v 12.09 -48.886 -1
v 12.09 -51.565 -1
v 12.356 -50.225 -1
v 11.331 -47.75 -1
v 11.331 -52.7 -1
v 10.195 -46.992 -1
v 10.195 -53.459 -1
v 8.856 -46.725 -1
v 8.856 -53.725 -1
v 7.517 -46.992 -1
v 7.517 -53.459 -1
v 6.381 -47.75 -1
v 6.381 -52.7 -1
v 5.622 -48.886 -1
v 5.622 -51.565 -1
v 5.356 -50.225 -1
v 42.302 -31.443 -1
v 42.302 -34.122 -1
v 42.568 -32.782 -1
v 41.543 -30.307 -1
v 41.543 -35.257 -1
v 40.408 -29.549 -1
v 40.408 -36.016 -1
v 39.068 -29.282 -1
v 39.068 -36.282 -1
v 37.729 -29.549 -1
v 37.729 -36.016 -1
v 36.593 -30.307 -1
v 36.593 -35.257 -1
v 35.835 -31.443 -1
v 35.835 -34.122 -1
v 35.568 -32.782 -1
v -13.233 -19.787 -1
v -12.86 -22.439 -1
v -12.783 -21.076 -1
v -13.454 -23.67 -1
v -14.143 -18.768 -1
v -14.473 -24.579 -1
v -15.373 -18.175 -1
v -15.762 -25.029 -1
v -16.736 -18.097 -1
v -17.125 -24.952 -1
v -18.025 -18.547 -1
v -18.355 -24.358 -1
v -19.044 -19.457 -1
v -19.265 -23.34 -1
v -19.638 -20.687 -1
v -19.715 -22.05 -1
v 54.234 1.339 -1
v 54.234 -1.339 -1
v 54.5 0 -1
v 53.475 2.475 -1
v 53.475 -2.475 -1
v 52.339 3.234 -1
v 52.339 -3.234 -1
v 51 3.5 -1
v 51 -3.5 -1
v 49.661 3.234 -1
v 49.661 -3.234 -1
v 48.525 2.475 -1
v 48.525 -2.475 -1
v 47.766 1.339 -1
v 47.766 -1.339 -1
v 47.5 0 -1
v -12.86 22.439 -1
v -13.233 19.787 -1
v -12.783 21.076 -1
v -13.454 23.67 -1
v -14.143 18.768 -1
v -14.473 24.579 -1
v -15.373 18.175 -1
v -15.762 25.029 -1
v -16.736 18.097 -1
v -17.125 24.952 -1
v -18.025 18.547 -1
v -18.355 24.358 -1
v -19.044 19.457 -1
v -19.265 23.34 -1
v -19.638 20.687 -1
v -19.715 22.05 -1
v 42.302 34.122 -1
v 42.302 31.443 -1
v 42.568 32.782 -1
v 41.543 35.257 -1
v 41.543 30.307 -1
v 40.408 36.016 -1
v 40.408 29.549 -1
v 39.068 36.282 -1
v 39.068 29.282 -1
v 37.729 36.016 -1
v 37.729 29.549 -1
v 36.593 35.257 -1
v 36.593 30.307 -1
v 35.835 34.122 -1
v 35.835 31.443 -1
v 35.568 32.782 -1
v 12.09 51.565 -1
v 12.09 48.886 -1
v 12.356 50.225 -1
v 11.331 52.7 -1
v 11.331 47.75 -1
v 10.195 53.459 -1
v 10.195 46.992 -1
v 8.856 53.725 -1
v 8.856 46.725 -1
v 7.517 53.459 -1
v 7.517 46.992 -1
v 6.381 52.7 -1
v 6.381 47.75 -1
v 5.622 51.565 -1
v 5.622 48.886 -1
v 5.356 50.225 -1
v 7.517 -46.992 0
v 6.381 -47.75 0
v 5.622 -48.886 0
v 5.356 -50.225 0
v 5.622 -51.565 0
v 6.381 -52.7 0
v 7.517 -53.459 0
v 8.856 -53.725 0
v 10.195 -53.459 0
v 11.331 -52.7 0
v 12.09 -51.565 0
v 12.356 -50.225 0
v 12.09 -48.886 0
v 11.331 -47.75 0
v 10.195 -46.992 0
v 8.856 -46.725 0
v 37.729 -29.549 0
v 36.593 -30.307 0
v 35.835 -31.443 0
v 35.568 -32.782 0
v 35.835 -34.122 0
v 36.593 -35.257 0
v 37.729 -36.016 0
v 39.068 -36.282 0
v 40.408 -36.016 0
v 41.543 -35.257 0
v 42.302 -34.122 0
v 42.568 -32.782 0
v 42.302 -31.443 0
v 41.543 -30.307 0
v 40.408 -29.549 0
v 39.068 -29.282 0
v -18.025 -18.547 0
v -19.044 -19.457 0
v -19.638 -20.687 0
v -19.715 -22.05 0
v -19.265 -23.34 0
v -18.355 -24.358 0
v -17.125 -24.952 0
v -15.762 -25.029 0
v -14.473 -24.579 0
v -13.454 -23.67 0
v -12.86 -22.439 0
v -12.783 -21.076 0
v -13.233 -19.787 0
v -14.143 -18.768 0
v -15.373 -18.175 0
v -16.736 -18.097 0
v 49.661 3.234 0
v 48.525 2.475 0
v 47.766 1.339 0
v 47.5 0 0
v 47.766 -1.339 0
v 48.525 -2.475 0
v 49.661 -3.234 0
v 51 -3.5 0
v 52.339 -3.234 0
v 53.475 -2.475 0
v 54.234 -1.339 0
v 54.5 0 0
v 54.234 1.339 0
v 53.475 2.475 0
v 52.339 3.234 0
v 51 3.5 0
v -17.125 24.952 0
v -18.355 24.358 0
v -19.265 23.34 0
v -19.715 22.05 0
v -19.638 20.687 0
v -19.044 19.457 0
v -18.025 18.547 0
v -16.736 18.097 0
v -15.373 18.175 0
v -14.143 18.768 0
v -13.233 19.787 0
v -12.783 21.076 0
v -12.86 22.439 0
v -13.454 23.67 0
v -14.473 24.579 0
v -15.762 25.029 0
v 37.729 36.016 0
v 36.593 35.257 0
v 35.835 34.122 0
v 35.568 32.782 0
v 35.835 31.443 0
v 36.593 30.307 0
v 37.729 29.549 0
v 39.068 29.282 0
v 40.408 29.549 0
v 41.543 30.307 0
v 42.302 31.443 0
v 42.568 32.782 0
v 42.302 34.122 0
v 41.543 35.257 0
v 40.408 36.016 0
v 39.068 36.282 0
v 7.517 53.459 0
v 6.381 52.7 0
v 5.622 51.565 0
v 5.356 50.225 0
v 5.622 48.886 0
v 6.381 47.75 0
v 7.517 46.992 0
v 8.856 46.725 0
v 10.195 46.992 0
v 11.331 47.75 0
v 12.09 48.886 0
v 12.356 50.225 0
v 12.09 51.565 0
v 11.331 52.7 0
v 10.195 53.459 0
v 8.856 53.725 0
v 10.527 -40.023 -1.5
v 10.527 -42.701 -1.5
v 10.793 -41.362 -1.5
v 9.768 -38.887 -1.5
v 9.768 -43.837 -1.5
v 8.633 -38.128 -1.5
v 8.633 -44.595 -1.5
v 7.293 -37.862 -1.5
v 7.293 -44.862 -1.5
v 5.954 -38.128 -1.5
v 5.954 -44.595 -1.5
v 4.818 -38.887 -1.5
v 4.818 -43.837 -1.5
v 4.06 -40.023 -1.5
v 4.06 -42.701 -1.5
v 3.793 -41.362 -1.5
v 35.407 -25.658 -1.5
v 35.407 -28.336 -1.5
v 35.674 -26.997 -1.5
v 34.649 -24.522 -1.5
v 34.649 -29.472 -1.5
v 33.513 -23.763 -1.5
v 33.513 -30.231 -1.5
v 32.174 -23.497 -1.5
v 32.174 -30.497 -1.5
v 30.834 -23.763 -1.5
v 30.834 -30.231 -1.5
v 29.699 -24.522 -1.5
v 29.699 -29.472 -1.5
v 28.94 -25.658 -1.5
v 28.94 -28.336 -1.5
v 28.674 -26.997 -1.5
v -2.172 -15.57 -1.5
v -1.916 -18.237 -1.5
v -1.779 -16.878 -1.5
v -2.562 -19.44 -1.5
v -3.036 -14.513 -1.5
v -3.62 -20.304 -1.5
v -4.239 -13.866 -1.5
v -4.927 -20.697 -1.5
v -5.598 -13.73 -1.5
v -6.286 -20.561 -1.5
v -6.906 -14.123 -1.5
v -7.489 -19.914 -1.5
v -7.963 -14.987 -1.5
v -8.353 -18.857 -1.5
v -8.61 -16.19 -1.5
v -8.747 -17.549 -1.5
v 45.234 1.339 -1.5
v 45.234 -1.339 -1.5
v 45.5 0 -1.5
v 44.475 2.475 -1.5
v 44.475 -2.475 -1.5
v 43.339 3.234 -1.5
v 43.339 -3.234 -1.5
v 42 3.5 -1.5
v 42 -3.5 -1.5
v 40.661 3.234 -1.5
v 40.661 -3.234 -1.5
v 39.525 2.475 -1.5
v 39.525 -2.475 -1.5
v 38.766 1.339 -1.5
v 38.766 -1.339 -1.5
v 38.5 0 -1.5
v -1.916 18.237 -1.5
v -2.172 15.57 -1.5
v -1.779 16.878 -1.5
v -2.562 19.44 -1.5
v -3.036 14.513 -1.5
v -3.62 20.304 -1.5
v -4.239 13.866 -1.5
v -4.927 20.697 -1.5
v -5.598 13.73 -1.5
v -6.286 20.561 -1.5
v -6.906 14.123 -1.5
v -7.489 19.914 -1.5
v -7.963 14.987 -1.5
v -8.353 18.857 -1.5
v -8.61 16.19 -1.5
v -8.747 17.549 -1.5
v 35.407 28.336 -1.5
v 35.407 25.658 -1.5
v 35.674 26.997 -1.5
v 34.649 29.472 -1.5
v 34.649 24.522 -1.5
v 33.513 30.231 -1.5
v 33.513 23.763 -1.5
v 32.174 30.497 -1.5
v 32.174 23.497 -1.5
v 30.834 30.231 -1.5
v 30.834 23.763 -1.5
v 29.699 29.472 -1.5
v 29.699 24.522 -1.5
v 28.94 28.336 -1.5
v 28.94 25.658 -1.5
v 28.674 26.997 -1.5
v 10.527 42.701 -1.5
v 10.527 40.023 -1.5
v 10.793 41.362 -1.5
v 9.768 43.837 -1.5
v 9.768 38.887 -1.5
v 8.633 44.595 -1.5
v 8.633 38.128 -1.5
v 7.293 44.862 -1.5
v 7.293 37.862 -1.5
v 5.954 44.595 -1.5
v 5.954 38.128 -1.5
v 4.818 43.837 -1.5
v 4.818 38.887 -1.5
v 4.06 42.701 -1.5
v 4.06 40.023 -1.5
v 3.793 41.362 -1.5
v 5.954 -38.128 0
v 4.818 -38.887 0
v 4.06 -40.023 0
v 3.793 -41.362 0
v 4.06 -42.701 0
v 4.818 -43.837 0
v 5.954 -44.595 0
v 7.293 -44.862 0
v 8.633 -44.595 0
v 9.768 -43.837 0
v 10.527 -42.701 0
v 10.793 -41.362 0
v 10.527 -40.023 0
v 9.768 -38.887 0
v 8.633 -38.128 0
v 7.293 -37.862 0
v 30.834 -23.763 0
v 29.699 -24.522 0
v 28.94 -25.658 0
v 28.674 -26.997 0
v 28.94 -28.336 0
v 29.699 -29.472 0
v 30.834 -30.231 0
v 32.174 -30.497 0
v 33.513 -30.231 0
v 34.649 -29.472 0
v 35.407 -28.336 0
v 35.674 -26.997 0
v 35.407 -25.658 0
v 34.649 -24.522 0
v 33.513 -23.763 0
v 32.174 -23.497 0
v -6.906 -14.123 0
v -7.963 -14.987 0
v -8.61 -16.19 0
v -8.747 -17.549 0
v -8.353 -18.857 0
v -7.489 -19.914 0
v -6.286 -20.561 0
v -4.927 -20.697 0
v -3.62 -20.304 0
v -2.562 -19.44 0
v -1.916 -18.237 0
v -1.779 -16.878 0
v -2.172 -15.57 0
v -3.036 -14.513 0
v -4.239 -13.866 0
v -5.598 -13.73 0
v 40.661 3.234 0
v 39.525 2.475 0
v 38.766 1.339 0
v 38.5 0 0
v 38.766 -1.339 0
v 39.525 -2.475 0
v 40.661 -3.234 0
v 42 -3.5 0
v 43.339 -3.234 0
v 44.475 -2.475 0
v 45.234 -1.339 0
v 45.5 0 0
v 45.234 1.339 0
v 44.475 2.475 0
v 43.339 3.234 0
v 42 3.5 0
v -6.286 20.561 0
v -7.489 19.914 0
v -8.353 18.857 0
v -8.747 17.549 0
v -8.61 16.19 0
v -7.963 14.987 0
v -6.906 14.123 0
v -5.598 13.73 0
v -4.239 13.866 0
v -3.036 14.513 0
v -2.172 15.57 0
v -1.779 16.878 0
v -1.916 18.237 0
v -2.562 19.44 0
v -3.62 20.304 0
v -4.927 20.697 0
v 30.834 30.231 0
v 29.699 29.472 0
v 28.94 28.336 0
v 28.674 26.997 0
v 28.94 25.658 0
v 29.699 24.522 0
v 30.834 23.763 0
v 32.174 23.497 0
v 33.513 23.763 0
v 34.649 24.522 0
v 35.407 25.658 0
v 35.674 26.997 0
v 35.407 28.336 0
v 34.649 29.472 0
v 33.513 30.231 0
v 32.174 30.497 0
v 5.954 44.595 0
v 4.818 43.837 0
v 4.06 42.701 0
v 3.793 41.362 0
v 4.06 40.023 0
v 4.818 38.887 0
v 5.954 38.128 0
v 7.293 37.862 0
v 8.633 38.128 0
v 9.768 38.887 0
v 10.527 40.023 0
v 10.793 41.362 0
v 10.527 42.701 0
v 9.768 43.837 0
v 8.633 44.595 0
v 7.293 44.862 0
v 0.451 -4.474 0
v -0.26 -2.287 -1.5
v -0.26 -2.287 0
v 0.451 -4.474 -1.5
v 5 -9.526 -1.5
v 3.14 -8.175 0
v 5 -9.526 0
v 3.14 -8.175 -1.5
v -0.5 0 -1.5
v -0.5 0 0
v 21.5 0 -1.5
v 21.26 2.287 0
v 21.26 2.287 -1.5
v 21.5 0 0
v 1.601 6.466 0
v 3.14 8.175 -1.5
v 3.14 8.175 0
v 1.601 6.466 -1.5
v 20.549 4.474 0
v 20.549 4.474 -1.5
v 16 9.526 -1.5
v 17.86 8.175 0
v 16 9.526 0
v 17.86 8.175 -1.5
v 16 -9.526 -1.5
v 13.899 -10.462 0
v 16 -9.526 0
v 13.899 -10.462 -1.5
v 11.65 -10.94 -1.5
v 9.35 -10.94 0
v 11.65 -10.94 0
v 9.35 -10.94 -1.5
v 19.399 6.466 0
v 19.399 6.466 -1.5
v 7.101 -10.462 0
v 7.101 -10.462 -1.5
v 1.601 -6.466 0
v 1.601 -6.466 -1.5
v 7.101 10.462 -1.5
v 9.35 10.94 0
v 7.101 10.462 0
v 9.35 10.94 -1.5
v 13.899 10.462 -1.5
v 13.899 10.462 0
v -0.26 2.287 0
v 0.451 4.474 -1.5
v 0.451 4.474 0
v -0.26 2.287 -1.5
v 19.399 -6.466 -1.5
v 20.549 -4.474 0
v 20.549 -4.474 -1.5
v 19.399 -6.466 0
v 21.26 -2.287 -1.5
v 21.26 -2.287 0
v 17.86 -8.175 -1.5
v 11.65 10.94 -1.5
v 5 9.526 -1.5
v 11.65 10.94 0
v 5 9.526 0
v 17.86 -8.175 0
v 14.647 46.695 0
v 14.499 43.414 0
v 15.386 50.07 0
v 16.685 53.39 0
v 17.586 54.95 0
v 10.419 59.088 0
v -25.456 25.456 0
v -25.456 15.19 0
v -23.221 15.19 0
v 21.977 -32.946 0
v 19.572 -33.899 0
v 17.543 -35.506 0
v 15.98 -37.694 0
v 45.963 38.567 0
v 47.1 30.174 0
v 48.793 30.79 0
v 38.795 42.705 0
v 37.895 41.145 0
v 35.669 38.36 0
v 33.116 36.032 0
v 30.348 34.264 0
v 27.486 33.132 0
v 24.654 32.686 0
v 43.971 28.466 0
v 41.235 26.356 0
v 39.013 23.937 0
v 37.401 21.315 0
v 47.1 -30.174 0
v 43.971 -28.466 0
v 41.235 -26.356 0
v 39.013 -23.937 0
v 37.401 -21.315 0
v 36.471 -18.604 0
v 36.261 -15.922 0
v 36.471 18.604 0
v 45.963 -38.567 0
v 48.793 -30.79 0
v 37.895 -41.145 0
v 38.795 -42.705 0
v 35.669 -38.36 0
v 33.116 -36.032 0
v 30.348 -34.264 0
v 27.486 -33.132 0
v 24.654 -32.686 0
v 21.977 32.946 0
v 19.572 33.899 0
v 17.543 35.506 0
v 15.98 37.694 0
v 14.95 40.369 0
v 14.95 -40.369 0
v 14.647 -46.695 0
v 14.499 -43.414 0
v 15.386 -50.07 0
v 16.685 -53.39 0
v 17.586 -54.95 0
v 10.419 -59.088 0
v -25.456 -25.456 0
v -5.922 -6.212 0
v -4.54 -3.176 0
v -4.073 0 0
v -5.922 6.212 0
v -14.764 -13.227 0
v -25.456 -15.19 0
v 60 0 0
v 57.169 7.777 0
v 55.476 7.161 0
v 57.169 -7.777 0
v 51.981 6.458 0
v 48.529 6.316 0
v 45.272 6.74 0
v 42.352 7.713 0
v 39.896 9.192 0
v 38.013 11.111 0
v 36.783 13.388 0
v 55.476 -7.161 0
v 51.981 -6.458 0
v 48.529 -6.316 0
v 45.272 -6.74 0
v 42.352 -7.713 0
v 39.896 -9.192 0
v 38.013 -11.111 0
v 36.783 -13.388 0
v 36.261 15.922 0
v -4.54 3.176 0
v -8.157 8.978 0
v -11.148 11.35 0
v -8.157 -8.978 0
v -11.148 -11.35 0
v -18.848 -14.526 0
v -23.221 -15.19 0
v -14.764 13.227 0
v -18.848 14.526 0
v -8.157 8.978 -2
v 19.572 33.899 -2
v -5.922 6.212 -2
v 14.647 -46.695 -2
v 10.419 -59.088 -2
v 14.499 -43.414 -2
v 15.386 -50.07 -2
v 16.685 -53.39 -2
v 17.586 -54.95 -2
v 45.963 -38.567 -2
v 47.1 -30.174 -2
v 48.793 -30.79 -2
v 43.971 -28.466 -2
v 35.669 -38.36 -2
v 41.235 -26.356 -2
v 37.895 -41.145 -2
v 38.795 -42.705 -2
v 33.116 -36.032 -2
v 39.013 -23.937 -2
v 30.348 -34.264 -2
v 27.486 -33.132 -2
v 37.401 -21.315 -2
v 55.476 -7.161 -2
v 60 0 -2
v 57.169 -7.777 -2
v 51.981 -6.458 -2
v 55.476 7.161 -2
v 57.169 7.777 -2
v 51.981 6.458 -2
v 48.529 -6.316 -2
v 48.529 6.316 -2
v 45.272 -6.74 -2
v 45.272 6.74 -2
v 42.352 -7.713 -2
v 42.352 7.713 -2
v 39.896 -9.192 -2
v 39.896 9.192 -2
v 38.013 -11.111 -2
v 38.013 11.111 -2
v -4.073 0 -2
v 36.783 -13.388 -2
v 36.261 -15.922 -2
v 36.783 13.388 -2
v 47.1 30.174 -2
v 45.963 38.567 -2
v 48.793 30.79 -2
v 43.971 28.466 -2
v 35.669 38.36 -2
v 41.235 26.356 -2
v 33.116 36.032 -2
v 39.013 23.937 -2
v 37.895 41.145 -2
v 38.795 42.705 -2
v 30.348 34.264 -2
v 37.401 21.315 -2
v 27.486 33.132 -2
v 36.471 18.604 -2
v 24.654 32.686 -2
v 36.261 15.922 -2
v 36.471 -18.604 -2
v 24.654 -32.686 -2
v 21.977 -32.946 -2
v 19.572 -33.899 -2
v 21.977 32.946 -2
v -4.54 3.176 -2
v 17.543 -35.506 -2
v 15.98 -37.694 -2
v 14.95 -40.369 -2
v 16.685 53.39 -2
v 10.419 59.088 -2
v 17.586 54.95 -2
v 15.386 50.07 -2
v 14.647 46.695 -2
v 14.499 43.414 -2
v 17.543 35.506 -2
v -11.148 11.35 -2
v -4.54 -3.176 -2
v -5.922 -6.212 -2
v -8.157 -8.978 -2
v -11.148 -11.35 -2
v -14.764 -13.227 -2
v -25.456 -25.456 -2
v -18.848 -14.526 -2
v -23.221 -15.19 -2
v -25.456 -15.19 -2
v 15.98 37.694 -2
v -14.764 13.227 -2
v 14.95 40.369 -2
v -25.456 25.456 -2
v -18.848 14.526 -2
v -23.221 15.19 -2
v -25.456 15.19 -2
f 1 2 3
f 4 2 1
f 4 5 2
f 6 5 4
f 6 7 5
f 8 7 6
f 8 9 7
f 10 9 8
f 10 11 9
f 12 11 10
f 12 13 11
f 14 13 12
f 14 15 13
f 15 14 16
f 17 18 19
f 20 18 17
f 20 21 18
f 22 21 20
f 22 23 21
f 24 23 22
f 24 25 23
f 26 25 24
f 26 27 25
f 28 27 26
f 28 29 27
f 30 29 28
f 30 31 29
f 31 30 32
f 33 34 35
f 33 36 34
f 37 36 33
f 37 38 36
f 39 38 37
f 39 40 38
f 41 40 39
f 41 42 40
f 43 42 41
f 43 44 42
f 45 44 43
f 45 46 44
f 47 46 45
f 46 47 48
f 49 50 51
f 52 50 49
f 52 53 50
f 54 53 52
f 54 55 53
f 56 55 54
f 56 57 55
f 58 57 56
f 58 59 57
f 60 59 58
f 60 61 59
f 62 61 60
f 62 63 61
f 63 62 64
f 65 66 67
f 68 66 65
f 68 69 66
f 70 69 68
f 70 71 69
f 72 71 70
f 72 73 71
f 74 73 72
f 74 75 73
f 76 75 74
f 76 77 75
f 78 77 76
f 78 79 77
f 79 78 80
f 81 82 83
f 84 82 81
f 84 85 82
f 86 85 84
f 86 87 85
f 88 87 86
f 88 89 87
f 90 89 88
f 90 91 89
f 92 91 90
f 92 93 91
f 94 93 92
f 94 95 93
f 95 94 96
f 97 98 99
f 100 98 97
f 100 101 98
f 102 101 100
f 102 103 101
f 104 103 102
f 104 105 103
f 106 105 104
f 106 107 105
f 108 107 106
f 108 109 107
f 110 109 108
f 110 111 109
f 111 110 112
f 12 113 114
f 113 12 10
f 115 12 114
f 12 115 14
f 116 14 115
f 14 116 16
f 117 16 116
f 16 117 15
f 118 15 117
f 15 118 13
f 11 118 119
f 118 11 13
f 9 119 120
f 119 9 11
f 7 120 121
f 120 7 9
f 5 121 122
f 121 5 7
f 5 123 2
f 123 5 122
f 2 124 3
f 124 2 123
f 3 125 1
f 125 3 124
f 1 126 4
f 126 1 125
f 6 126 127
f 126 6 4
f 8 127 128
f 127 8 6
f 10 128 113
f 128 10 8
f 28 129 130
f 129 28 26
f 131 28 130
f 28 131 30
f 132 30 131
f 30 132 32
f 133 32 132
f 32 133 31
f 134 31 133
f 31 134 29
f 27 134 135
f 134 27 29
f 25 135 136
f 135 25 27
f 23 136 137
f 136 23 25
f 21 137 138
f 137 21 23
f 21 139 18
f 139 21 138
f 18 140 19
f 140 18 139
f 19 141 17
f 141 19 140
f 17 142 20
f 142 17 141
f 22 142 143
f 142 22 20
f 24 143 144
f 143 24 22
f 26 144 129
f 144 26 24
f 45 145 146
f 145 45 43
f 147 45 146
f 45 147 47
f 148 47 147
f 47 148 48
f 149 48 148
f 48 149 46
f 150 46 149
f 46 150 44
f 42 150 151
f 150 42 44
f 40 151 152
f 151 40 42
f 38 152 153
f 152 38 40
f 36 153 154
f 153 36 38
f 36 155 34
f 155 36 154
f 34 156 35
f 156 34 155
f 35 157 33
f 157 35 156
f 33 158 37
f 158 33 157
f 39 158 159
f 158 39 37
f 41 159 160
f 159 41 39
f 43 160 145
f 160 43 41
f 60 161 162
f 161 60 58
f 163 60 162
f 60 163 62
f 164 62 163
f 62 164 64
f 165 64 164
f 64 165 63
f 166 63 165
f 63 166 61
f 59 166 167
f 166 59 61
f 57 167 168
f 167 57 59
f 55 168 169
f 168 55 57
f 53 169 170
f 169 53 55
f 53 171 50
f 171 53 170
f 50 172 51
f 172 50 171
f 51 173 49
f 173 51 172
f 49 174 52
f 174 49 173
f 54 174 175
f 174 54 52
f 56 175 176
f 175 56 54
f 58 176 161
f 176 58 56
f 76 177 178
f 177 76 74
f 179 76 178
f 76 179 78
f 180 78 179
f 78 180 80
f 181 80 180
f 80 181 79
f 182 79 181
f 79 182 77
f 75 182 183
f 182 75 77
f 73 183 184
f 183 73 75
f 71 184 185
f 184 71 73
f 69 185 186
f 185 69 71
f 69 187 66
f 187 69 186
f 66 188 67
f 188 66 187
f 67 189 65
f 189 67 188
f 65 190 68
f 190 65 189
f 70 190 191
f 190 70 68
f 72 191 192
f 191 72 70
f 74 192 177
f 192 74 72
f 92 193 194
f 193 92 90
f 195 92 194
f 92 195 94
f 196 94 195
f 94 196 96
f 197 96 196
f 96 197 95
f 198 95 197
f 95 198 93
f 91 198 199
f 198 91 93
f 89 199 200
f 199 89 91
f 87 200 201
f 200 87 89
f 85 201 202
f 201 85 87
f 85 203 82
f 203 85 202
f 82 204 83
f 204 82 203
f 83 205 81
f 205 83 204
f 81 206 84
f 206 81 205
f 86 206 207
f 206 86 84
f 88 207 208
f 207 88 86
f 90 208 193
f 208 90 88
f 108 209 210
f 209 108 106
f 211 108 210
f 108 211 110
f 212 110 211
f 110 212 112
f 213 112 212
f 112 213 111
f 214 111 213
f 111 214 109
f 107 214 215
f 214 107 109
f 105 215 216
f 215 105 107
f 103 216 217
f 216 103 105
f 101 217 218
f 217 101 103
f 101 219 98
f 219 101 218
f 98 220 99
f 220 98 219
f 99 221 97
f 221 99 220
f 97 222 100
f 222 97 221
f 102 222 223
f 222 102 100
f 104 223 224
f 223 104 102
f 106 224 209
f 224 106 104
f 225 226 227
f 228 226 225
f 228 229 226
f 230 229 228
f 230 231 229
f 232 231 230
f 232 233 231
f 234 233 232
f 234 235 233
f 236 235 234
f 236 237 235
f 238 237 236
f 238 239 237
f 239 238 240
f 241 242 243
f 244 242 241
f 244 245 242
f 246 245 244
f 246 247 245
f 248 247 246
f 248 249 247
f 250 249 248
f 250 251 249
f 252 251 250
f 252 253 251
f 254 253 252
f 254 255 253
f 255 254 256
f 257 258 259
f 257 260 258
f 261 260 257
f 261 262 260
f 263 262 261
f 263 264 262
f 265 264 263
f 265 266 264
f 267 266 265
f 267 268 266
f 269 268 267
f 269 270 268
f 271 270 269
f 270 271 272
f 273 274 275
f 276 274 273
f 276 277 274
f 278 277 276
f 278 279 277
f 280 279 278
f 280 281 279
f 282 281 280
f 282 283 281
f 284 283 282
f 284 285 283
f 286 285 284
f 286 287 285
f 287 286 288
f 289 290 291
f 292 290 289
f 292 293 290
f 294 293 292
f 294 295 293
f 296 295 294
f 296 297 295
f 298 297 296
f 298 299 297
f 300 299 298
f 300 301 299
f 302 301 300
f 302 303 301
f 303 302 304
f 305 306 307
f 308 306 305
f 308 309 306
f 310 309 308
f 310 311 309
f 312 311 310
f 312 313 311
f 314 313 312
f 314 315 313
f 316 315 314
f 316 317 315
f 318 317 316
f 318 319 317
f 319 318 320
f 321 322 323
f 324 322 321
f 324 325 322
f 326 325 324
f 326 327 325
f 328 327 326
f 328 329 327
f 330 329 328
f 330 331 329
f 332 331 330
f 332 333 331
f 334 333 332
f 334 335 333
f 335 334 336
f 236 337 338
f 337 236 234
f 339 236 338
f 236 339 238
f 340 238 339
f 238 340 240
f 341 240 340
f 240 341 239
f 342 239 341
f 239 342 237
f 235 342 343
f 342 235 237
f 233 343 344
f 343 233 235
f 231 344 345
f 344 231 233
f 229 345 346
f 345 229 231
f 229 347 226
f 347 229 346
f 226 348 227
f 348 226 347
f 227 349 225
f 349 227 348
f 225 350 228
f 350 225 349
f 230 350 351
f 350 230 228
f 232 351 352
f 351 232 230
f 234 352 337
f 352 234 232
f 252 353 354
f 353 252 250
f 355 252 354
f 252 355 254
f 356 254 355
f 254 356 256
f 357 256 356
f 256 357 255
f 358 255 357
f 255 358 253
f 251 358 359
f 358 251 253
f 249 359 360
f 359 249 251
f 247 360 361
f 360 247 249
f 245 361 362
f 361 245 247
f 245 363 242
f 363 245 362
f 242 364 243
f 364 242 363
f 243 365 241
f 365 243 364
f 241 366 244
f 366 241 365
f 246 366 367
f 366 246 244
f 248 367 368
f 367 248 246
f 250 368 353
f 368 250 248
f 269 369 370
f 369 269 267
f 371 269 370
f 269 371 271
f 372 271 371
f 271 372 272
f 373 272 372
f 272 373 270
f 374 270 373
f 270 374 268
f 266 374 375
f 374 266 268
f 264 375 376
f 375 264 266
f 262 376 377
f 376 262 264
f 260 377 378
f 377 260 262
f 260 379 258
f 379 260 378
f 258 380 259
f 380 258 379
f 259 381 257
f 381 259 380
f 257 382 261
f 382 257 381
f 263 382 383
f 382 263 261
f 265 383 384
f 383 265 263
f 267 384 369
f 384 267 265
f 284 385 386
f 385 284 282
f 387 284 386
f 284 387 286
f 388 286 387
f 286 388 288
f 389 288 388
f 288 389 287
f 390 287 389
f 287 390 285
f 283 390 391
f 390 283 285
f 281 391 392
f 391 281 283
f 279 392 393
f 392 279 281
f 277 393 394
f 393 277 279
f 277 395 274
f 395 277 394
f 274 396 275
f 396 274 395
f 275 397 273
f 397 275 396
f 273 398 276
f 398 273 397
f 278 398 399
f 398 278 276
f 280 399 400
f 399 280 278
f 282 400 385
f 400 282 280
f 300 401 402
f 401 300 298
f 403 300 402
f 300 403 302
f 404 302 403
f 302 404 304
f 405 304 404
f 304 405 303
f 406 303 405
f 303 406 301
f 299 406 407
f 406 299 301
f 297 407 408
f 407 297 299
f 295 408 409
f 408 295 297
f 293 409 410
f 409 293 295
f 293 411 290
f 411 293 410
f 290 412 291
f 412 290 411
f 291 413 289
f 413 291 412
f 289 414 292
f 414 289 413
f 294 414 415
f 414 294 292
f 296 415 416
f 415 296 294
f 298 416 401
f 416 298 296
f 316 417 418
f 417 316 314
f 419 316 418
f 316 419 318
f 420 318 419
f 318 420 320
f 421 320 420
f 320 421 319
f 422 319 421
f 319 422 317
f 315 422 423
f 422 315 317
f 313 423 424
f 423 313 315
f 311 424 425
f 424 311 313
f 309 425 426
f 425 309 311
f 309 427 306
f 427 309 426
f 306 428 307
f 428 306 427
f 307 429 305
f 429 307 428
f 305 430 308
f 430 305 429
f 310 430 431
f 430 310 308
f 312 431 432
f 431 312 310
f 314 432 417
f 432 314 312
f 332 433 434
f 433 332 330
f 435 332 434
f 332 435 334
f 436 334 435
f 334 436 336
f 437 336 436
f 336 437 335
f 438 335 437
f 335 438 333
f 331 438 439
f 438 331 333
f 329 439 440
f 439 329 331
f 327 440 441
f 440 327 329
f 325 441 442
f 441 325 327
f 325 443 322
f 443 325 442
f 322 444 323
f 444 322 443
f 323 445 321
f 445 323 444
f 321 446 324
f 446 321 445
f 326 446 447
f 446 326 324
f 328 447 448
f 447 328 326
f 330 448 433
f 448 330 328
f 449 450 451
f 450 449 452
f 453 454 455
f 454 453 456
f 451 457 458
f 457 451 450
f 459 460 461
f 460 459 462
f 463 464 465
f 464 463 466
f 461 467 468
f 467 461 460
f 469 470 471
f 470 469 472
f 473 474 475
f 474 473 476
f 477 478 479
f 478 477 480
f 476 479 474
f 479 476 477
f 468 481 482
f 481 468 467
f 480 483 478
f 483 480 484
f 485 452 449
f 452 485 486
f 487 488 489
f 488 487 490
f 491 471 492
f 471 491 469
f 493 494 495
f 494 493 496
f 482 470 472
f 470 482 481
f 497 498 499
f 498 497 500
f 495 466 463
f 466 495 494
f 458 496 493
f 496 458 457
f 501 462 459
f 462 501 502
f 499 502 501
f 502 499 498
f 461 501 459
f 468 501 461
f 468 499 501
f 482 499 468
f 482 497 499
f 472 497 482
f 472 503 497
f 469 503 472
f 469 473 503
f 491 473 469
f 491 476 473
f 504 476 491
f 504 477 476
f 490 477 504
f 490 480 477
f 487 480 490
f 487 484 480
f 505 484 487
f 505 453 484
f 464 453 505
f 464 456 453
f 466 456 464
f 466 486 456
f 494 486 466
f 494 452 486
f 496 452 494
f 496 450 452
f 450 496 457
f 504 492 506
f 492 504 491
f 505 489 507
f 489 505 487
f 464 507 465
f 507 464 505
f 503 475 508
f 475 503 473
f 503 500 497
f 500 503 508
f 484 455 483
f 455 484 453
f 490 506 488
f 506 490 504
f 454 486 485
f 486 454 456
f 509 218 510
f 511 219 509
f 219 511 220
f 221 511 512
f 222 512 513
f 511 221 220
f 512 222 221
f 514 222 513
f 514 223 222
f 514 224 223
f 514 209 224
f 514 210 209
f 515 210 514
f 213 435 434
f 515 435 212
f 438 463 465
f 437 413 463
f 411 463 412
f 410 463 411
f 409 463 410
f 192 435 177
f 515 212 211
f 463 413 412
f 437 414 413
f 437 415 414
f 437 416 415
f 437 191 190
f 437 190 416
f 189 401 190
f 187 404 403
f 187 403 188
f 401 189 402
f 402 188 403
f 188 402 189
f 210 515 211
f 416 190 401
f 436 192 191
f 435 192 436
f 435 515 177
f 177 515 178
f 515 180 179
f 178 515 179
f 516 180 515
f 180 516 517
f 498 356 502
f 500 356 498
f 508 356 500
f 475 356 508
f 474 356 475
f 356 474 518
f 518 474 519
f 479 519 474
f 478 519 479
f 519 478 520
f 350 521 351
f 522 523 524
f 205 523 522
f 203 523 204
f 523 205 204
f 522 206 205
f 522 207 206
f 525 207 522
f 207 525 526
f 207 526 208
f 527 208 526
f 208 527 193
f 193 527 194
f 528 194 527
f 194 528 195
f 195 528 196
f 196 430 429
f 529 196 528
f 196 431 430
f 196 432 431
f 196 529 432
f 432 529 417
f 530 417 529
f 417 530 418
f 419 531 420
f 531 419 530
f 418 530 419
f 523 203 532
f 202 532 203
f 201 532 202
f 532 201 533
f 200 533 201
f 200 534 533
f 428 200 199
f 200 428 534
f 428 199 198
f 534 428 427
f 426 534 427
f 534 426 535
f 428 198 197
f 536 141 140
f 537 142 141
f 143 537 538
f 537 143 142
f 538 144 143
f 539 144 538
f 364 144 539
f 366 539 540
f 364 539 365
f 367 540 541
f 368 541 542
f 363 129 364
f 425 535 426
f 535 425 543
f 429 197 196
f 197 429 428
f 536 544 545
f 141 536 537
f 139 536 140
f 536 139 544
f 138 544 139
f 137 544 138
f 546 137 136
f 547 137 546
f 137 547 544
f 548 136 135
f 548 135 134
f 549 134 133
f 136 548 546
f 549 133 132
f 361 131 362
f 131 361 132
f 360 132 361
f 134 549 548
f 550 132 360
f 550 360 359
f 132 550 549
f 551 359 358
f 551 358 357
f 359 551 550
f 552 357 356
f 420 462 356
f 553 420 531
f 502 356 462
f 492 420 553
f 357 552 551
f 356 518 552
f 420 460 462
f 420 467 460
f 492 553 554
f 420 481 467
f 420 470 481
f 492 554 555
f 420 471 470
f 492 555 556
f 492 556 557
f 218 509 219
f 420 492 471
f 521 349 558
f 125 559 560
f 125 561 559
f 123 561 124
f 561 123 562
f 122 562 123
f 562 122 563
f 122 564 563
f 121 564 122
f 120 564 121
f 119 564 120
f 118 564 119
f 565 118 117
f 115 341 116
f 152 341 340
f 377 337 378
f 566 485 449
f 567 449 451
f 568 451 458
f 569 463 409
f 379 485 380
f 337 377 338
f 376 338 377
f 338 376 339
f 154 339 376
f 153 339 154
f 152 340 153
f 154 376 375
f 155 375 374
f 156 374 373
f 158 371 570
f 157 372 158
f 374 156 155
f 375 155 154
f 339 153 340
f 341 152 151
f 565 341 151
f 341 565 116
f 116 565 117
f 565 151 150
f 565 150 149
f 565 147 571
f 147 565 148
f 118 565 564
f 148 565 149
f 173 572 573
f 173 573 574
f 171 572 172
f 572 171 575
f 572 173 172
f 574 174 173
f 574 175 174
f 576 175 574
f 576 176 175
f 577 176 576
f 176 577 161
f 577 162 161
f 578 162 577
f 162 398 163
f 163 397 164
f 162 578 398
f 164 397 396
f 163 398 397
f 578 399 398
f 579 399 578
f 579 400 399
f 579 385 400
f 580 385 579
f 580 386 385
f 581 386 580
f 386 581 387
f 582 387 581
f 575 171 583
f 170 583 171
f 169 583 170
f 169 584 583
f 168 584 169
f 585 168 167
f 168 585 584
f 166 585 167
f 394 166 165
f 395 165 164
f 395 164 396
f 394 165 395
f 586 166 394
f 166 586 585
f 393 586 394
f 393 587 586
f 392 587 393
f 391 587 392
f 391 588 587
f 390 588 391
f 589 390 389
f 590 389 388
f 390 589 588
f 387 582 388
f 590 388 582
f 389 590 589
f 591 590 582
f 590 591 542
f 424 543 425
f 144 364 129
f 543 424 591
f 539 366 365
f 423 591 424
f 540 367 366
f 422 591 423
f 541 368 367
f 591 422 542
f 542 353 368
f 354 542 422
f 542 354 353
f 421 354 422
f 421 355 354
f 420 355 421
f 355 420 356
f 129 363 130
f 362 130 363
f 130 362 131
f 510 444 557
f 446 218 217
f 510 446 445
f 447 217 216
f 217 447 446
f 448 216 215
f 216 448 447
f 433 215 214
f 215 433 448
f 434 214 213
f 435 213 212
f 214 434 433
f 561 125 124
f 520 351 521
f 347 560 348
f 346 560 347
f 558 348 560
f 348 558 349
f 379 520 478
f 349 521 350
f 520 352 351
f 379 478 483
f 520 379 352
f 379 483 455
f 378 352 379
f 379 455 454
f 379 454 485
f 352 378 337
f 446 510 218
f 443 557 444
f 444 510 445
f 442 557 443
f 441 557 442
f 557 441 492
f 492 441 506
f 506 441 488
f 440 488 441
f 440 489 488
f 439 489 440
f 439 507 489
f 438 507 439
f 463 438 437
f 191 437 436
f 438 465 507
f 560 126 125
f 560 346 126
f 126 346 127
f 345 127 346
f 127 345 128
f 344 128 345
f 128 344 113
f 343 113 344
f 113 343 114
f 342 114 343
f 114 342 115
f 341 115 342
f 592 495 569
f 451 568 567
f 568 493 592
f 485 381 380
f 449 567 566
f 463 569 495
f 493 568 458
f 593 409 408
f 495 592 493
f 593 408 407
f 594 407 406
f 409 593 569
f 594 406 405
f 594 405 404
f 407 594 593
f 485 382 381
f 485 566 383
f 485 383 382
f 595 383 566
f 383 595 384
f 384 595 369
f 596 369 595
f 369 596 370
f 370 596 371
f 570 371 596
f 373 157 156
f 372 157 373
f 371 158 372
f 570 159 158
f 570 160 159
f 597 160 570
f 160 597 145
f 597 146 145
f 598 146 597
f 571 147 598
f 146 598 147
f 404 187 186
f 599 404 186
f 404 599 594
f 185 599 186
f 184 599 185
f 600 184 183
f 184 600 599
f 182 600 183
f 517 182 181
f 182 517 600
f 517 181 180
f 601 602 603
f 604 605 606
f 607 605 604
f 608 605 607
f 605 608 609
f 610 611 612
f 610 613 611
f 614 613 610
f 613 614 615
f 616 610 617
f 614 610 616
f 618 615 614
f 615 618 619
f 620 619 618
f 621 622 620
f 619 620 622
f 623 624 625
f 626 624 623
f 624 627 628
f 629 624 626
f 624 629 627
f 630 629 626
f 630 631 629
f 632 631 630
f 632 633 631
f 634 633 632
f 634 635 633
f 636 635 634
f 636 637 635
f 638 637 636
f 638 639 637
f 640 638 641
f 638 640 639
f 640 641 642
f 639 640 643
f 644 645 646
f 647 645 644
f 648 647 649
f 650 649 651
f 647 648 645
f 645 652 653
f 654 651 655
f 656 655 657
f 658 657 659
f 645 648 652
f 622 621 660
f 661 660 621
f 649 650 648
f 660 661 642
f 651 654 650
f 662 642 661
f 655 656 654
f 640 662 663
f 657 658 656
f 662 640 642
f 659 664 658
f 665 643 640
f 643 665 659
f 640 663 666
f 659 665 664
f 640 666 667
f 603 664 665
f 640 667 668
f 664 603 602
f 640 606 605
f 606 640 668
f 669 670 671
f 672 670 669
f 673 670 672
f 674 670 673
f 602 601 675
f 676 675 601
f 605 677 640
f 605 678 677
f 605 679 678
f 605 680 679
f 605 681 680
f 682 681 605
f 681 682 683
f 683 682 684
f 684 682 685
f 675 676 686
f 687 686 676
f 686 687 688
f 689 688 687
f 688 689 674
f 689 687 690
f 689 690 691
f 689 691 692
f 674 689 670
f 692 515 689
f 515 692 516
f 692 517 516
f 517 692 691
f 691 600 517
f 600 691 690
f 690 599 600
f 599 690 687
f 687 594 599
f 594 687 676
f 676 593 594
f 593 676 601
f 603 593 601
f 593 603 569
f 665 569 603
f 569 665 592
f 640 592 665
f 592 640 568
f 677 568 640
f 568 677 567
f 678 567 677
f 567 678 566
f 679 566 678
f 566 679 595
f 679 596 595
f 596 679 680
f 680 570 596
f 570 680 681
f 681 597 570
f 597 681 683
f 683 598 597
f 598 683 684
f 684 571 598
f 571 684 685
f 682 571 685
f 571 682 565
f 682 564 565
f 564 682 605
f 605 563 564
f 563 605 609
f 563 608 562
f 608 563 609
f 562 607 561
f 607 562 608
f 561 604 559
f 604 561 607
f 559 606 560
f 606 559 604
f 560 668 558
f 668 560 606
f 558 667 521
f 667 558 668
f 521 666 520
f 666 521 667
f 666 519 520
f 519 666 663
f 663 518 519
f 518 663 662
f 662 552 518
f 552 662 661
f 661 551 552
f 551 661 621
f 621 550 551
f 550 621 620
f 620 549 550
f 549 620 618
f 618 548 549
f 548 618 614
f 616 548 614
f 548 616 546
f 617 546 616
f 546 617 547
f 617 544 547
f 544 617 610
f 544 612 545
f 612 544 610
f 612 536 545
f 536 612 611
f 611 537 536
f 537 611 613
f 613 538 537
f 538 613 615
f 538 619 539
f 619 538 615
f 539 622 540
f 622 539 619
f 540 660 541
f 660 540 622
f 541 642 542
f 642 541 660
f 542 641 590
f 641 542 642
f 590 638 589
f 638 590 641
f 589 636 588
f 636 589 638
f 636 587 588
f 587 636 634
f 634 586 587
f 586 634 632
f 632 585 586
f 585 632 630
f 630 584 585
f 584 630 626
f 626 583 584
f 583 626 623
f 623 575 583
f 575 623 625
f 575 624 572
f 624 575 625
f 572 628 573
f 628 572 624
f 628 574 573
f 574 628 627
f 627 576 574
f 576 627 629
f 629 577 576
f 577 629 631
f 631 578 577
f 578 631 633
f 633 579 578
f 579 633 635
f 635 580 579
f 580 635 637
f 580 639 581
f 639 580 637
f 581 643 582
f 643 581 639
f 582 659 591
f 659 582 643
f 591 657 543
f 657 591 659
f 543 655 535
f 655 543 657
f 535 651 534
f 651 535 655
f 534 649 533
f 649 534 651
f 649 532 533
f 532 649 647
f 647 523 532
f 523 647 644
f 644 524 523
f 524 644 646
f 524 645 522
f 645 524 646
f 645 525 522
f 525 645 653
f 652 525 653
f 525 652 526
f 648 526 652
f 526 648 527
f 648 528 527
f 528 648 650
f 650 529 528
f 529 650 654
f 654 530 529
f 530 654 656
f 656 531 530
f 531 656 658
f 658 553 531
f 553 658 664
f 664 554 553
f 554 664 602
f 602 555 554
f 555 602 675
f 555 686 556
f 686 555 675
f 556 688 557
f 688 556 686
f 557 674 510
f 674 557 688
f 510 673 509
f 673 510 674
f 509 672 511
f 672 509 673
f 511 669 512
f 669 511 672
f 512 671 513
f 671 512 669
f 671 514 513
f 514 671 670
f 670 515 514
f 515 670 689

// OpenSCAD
thumbAngularWidth = 90;
otherFingerAngularWidth = 40;
thumbDistanceRatio = 0.6;
outerRadius = 60;

spacing=3;
thickness=2;
innerPostHoleDepth=1.5;
outerPostHoleDepth=1;
tolerance=0.5;
postDiameter=6;

inset1 = 1.5;
inset2 = inset1 + 1.5;

bottom = false;

nudge = 0.001;

angularWidths = [thumbAngularWidth, otherFingerAngularWidth, otherFingerAngularWidth, otherFingerAngularWidth, otherFingerAngularWidth];
holeAngles = [0, 180-1.5*otherFingerAngularWidth, 180-.5*otherFingerAngularWidth, 180+.5*otherFingerAngularWidth, 180+1.5*otherFingerAngularWidth];
radii = outerRadius*[thumbDistanceRatio, 1, 1, 1, 1];

poly = [for (ii = [0:9]) let(i=floor(ii/2),sign=ii%2*2-1) radii[i] * [cos(holeAngles[i]+sign*angularWidths[i]/2), sin(holeAngles[i]+sign*angularWidths[i]/2)]];
    
function norm2D(v) = sqrt(pow(v[0],2)+pow(v[1],2));

function distance2D(a,b) = norm2D(a-b);
    
module base() {
    render(convexity=6)
    difference() {
        polygon(points=poly);
        for (i = [0:4]) {
            a=poly[i*2];
            b=poly[i*2+1];
            translate(.5*(a+b))
                rotate(holeAngles[i])
                scale([1.4,1.]) circle(d=0.6*distance2D(a,b));
        }
    }
}

module posts(inset,tolerance=0,thumbTweak=0) {
    for(i=[0:9]) {
        r = norm2D(poly[i]);
        r1 = r - inset;
        rotate = i==0 ? -thumbTweak : (i==1 ? thumbTweak : 0);
        rotate(rotate) translate(poly[i]/r*r1) circle(d=postDiameter+tolerance*2,$fn=16);
    }
}

render(convexity=10)
if (bottom) {
    linear_extrude(height=thickness) base();
    linear_extrude(height=thickness+spacing+outerPostHoleDepth) posts(postDiameter*inset1,thumbTweak=8);
    linear_extrude(height=thickness+spacing+innerPostHoleDepth) posts(postDiameter*inset2,thumbTweak=28);
    linear_extrude(height=thickness+spacing+innerPostHoleDepth) translate([-outerRadius*.35/2,0,0]) circle(d=outerRadius*0.35);
}
else {
    scale([-1,-1,-1]) {
        difference() {
            linear_extrude(height=thickness) base();
            translate([0,0,-nudge]) {
                linear_extrude(height=outerPostHoleDepth+nudge) posts(postDiameter*inset1,thumbTweak=8,tolerance=tolerance);
                linear_extrude(height=innerPostHoleDepth+nudge) posts(postDiameter*inset2,thumbTweak=28,tolerance=tolerance);
                linear_extrude(height=innerPostHoleDepth+nudge) translate([-outerRadius*.35/2,0,0]) circle(d=outerRadius*0.35+tolerance*2);
            }
        }
    }
}
